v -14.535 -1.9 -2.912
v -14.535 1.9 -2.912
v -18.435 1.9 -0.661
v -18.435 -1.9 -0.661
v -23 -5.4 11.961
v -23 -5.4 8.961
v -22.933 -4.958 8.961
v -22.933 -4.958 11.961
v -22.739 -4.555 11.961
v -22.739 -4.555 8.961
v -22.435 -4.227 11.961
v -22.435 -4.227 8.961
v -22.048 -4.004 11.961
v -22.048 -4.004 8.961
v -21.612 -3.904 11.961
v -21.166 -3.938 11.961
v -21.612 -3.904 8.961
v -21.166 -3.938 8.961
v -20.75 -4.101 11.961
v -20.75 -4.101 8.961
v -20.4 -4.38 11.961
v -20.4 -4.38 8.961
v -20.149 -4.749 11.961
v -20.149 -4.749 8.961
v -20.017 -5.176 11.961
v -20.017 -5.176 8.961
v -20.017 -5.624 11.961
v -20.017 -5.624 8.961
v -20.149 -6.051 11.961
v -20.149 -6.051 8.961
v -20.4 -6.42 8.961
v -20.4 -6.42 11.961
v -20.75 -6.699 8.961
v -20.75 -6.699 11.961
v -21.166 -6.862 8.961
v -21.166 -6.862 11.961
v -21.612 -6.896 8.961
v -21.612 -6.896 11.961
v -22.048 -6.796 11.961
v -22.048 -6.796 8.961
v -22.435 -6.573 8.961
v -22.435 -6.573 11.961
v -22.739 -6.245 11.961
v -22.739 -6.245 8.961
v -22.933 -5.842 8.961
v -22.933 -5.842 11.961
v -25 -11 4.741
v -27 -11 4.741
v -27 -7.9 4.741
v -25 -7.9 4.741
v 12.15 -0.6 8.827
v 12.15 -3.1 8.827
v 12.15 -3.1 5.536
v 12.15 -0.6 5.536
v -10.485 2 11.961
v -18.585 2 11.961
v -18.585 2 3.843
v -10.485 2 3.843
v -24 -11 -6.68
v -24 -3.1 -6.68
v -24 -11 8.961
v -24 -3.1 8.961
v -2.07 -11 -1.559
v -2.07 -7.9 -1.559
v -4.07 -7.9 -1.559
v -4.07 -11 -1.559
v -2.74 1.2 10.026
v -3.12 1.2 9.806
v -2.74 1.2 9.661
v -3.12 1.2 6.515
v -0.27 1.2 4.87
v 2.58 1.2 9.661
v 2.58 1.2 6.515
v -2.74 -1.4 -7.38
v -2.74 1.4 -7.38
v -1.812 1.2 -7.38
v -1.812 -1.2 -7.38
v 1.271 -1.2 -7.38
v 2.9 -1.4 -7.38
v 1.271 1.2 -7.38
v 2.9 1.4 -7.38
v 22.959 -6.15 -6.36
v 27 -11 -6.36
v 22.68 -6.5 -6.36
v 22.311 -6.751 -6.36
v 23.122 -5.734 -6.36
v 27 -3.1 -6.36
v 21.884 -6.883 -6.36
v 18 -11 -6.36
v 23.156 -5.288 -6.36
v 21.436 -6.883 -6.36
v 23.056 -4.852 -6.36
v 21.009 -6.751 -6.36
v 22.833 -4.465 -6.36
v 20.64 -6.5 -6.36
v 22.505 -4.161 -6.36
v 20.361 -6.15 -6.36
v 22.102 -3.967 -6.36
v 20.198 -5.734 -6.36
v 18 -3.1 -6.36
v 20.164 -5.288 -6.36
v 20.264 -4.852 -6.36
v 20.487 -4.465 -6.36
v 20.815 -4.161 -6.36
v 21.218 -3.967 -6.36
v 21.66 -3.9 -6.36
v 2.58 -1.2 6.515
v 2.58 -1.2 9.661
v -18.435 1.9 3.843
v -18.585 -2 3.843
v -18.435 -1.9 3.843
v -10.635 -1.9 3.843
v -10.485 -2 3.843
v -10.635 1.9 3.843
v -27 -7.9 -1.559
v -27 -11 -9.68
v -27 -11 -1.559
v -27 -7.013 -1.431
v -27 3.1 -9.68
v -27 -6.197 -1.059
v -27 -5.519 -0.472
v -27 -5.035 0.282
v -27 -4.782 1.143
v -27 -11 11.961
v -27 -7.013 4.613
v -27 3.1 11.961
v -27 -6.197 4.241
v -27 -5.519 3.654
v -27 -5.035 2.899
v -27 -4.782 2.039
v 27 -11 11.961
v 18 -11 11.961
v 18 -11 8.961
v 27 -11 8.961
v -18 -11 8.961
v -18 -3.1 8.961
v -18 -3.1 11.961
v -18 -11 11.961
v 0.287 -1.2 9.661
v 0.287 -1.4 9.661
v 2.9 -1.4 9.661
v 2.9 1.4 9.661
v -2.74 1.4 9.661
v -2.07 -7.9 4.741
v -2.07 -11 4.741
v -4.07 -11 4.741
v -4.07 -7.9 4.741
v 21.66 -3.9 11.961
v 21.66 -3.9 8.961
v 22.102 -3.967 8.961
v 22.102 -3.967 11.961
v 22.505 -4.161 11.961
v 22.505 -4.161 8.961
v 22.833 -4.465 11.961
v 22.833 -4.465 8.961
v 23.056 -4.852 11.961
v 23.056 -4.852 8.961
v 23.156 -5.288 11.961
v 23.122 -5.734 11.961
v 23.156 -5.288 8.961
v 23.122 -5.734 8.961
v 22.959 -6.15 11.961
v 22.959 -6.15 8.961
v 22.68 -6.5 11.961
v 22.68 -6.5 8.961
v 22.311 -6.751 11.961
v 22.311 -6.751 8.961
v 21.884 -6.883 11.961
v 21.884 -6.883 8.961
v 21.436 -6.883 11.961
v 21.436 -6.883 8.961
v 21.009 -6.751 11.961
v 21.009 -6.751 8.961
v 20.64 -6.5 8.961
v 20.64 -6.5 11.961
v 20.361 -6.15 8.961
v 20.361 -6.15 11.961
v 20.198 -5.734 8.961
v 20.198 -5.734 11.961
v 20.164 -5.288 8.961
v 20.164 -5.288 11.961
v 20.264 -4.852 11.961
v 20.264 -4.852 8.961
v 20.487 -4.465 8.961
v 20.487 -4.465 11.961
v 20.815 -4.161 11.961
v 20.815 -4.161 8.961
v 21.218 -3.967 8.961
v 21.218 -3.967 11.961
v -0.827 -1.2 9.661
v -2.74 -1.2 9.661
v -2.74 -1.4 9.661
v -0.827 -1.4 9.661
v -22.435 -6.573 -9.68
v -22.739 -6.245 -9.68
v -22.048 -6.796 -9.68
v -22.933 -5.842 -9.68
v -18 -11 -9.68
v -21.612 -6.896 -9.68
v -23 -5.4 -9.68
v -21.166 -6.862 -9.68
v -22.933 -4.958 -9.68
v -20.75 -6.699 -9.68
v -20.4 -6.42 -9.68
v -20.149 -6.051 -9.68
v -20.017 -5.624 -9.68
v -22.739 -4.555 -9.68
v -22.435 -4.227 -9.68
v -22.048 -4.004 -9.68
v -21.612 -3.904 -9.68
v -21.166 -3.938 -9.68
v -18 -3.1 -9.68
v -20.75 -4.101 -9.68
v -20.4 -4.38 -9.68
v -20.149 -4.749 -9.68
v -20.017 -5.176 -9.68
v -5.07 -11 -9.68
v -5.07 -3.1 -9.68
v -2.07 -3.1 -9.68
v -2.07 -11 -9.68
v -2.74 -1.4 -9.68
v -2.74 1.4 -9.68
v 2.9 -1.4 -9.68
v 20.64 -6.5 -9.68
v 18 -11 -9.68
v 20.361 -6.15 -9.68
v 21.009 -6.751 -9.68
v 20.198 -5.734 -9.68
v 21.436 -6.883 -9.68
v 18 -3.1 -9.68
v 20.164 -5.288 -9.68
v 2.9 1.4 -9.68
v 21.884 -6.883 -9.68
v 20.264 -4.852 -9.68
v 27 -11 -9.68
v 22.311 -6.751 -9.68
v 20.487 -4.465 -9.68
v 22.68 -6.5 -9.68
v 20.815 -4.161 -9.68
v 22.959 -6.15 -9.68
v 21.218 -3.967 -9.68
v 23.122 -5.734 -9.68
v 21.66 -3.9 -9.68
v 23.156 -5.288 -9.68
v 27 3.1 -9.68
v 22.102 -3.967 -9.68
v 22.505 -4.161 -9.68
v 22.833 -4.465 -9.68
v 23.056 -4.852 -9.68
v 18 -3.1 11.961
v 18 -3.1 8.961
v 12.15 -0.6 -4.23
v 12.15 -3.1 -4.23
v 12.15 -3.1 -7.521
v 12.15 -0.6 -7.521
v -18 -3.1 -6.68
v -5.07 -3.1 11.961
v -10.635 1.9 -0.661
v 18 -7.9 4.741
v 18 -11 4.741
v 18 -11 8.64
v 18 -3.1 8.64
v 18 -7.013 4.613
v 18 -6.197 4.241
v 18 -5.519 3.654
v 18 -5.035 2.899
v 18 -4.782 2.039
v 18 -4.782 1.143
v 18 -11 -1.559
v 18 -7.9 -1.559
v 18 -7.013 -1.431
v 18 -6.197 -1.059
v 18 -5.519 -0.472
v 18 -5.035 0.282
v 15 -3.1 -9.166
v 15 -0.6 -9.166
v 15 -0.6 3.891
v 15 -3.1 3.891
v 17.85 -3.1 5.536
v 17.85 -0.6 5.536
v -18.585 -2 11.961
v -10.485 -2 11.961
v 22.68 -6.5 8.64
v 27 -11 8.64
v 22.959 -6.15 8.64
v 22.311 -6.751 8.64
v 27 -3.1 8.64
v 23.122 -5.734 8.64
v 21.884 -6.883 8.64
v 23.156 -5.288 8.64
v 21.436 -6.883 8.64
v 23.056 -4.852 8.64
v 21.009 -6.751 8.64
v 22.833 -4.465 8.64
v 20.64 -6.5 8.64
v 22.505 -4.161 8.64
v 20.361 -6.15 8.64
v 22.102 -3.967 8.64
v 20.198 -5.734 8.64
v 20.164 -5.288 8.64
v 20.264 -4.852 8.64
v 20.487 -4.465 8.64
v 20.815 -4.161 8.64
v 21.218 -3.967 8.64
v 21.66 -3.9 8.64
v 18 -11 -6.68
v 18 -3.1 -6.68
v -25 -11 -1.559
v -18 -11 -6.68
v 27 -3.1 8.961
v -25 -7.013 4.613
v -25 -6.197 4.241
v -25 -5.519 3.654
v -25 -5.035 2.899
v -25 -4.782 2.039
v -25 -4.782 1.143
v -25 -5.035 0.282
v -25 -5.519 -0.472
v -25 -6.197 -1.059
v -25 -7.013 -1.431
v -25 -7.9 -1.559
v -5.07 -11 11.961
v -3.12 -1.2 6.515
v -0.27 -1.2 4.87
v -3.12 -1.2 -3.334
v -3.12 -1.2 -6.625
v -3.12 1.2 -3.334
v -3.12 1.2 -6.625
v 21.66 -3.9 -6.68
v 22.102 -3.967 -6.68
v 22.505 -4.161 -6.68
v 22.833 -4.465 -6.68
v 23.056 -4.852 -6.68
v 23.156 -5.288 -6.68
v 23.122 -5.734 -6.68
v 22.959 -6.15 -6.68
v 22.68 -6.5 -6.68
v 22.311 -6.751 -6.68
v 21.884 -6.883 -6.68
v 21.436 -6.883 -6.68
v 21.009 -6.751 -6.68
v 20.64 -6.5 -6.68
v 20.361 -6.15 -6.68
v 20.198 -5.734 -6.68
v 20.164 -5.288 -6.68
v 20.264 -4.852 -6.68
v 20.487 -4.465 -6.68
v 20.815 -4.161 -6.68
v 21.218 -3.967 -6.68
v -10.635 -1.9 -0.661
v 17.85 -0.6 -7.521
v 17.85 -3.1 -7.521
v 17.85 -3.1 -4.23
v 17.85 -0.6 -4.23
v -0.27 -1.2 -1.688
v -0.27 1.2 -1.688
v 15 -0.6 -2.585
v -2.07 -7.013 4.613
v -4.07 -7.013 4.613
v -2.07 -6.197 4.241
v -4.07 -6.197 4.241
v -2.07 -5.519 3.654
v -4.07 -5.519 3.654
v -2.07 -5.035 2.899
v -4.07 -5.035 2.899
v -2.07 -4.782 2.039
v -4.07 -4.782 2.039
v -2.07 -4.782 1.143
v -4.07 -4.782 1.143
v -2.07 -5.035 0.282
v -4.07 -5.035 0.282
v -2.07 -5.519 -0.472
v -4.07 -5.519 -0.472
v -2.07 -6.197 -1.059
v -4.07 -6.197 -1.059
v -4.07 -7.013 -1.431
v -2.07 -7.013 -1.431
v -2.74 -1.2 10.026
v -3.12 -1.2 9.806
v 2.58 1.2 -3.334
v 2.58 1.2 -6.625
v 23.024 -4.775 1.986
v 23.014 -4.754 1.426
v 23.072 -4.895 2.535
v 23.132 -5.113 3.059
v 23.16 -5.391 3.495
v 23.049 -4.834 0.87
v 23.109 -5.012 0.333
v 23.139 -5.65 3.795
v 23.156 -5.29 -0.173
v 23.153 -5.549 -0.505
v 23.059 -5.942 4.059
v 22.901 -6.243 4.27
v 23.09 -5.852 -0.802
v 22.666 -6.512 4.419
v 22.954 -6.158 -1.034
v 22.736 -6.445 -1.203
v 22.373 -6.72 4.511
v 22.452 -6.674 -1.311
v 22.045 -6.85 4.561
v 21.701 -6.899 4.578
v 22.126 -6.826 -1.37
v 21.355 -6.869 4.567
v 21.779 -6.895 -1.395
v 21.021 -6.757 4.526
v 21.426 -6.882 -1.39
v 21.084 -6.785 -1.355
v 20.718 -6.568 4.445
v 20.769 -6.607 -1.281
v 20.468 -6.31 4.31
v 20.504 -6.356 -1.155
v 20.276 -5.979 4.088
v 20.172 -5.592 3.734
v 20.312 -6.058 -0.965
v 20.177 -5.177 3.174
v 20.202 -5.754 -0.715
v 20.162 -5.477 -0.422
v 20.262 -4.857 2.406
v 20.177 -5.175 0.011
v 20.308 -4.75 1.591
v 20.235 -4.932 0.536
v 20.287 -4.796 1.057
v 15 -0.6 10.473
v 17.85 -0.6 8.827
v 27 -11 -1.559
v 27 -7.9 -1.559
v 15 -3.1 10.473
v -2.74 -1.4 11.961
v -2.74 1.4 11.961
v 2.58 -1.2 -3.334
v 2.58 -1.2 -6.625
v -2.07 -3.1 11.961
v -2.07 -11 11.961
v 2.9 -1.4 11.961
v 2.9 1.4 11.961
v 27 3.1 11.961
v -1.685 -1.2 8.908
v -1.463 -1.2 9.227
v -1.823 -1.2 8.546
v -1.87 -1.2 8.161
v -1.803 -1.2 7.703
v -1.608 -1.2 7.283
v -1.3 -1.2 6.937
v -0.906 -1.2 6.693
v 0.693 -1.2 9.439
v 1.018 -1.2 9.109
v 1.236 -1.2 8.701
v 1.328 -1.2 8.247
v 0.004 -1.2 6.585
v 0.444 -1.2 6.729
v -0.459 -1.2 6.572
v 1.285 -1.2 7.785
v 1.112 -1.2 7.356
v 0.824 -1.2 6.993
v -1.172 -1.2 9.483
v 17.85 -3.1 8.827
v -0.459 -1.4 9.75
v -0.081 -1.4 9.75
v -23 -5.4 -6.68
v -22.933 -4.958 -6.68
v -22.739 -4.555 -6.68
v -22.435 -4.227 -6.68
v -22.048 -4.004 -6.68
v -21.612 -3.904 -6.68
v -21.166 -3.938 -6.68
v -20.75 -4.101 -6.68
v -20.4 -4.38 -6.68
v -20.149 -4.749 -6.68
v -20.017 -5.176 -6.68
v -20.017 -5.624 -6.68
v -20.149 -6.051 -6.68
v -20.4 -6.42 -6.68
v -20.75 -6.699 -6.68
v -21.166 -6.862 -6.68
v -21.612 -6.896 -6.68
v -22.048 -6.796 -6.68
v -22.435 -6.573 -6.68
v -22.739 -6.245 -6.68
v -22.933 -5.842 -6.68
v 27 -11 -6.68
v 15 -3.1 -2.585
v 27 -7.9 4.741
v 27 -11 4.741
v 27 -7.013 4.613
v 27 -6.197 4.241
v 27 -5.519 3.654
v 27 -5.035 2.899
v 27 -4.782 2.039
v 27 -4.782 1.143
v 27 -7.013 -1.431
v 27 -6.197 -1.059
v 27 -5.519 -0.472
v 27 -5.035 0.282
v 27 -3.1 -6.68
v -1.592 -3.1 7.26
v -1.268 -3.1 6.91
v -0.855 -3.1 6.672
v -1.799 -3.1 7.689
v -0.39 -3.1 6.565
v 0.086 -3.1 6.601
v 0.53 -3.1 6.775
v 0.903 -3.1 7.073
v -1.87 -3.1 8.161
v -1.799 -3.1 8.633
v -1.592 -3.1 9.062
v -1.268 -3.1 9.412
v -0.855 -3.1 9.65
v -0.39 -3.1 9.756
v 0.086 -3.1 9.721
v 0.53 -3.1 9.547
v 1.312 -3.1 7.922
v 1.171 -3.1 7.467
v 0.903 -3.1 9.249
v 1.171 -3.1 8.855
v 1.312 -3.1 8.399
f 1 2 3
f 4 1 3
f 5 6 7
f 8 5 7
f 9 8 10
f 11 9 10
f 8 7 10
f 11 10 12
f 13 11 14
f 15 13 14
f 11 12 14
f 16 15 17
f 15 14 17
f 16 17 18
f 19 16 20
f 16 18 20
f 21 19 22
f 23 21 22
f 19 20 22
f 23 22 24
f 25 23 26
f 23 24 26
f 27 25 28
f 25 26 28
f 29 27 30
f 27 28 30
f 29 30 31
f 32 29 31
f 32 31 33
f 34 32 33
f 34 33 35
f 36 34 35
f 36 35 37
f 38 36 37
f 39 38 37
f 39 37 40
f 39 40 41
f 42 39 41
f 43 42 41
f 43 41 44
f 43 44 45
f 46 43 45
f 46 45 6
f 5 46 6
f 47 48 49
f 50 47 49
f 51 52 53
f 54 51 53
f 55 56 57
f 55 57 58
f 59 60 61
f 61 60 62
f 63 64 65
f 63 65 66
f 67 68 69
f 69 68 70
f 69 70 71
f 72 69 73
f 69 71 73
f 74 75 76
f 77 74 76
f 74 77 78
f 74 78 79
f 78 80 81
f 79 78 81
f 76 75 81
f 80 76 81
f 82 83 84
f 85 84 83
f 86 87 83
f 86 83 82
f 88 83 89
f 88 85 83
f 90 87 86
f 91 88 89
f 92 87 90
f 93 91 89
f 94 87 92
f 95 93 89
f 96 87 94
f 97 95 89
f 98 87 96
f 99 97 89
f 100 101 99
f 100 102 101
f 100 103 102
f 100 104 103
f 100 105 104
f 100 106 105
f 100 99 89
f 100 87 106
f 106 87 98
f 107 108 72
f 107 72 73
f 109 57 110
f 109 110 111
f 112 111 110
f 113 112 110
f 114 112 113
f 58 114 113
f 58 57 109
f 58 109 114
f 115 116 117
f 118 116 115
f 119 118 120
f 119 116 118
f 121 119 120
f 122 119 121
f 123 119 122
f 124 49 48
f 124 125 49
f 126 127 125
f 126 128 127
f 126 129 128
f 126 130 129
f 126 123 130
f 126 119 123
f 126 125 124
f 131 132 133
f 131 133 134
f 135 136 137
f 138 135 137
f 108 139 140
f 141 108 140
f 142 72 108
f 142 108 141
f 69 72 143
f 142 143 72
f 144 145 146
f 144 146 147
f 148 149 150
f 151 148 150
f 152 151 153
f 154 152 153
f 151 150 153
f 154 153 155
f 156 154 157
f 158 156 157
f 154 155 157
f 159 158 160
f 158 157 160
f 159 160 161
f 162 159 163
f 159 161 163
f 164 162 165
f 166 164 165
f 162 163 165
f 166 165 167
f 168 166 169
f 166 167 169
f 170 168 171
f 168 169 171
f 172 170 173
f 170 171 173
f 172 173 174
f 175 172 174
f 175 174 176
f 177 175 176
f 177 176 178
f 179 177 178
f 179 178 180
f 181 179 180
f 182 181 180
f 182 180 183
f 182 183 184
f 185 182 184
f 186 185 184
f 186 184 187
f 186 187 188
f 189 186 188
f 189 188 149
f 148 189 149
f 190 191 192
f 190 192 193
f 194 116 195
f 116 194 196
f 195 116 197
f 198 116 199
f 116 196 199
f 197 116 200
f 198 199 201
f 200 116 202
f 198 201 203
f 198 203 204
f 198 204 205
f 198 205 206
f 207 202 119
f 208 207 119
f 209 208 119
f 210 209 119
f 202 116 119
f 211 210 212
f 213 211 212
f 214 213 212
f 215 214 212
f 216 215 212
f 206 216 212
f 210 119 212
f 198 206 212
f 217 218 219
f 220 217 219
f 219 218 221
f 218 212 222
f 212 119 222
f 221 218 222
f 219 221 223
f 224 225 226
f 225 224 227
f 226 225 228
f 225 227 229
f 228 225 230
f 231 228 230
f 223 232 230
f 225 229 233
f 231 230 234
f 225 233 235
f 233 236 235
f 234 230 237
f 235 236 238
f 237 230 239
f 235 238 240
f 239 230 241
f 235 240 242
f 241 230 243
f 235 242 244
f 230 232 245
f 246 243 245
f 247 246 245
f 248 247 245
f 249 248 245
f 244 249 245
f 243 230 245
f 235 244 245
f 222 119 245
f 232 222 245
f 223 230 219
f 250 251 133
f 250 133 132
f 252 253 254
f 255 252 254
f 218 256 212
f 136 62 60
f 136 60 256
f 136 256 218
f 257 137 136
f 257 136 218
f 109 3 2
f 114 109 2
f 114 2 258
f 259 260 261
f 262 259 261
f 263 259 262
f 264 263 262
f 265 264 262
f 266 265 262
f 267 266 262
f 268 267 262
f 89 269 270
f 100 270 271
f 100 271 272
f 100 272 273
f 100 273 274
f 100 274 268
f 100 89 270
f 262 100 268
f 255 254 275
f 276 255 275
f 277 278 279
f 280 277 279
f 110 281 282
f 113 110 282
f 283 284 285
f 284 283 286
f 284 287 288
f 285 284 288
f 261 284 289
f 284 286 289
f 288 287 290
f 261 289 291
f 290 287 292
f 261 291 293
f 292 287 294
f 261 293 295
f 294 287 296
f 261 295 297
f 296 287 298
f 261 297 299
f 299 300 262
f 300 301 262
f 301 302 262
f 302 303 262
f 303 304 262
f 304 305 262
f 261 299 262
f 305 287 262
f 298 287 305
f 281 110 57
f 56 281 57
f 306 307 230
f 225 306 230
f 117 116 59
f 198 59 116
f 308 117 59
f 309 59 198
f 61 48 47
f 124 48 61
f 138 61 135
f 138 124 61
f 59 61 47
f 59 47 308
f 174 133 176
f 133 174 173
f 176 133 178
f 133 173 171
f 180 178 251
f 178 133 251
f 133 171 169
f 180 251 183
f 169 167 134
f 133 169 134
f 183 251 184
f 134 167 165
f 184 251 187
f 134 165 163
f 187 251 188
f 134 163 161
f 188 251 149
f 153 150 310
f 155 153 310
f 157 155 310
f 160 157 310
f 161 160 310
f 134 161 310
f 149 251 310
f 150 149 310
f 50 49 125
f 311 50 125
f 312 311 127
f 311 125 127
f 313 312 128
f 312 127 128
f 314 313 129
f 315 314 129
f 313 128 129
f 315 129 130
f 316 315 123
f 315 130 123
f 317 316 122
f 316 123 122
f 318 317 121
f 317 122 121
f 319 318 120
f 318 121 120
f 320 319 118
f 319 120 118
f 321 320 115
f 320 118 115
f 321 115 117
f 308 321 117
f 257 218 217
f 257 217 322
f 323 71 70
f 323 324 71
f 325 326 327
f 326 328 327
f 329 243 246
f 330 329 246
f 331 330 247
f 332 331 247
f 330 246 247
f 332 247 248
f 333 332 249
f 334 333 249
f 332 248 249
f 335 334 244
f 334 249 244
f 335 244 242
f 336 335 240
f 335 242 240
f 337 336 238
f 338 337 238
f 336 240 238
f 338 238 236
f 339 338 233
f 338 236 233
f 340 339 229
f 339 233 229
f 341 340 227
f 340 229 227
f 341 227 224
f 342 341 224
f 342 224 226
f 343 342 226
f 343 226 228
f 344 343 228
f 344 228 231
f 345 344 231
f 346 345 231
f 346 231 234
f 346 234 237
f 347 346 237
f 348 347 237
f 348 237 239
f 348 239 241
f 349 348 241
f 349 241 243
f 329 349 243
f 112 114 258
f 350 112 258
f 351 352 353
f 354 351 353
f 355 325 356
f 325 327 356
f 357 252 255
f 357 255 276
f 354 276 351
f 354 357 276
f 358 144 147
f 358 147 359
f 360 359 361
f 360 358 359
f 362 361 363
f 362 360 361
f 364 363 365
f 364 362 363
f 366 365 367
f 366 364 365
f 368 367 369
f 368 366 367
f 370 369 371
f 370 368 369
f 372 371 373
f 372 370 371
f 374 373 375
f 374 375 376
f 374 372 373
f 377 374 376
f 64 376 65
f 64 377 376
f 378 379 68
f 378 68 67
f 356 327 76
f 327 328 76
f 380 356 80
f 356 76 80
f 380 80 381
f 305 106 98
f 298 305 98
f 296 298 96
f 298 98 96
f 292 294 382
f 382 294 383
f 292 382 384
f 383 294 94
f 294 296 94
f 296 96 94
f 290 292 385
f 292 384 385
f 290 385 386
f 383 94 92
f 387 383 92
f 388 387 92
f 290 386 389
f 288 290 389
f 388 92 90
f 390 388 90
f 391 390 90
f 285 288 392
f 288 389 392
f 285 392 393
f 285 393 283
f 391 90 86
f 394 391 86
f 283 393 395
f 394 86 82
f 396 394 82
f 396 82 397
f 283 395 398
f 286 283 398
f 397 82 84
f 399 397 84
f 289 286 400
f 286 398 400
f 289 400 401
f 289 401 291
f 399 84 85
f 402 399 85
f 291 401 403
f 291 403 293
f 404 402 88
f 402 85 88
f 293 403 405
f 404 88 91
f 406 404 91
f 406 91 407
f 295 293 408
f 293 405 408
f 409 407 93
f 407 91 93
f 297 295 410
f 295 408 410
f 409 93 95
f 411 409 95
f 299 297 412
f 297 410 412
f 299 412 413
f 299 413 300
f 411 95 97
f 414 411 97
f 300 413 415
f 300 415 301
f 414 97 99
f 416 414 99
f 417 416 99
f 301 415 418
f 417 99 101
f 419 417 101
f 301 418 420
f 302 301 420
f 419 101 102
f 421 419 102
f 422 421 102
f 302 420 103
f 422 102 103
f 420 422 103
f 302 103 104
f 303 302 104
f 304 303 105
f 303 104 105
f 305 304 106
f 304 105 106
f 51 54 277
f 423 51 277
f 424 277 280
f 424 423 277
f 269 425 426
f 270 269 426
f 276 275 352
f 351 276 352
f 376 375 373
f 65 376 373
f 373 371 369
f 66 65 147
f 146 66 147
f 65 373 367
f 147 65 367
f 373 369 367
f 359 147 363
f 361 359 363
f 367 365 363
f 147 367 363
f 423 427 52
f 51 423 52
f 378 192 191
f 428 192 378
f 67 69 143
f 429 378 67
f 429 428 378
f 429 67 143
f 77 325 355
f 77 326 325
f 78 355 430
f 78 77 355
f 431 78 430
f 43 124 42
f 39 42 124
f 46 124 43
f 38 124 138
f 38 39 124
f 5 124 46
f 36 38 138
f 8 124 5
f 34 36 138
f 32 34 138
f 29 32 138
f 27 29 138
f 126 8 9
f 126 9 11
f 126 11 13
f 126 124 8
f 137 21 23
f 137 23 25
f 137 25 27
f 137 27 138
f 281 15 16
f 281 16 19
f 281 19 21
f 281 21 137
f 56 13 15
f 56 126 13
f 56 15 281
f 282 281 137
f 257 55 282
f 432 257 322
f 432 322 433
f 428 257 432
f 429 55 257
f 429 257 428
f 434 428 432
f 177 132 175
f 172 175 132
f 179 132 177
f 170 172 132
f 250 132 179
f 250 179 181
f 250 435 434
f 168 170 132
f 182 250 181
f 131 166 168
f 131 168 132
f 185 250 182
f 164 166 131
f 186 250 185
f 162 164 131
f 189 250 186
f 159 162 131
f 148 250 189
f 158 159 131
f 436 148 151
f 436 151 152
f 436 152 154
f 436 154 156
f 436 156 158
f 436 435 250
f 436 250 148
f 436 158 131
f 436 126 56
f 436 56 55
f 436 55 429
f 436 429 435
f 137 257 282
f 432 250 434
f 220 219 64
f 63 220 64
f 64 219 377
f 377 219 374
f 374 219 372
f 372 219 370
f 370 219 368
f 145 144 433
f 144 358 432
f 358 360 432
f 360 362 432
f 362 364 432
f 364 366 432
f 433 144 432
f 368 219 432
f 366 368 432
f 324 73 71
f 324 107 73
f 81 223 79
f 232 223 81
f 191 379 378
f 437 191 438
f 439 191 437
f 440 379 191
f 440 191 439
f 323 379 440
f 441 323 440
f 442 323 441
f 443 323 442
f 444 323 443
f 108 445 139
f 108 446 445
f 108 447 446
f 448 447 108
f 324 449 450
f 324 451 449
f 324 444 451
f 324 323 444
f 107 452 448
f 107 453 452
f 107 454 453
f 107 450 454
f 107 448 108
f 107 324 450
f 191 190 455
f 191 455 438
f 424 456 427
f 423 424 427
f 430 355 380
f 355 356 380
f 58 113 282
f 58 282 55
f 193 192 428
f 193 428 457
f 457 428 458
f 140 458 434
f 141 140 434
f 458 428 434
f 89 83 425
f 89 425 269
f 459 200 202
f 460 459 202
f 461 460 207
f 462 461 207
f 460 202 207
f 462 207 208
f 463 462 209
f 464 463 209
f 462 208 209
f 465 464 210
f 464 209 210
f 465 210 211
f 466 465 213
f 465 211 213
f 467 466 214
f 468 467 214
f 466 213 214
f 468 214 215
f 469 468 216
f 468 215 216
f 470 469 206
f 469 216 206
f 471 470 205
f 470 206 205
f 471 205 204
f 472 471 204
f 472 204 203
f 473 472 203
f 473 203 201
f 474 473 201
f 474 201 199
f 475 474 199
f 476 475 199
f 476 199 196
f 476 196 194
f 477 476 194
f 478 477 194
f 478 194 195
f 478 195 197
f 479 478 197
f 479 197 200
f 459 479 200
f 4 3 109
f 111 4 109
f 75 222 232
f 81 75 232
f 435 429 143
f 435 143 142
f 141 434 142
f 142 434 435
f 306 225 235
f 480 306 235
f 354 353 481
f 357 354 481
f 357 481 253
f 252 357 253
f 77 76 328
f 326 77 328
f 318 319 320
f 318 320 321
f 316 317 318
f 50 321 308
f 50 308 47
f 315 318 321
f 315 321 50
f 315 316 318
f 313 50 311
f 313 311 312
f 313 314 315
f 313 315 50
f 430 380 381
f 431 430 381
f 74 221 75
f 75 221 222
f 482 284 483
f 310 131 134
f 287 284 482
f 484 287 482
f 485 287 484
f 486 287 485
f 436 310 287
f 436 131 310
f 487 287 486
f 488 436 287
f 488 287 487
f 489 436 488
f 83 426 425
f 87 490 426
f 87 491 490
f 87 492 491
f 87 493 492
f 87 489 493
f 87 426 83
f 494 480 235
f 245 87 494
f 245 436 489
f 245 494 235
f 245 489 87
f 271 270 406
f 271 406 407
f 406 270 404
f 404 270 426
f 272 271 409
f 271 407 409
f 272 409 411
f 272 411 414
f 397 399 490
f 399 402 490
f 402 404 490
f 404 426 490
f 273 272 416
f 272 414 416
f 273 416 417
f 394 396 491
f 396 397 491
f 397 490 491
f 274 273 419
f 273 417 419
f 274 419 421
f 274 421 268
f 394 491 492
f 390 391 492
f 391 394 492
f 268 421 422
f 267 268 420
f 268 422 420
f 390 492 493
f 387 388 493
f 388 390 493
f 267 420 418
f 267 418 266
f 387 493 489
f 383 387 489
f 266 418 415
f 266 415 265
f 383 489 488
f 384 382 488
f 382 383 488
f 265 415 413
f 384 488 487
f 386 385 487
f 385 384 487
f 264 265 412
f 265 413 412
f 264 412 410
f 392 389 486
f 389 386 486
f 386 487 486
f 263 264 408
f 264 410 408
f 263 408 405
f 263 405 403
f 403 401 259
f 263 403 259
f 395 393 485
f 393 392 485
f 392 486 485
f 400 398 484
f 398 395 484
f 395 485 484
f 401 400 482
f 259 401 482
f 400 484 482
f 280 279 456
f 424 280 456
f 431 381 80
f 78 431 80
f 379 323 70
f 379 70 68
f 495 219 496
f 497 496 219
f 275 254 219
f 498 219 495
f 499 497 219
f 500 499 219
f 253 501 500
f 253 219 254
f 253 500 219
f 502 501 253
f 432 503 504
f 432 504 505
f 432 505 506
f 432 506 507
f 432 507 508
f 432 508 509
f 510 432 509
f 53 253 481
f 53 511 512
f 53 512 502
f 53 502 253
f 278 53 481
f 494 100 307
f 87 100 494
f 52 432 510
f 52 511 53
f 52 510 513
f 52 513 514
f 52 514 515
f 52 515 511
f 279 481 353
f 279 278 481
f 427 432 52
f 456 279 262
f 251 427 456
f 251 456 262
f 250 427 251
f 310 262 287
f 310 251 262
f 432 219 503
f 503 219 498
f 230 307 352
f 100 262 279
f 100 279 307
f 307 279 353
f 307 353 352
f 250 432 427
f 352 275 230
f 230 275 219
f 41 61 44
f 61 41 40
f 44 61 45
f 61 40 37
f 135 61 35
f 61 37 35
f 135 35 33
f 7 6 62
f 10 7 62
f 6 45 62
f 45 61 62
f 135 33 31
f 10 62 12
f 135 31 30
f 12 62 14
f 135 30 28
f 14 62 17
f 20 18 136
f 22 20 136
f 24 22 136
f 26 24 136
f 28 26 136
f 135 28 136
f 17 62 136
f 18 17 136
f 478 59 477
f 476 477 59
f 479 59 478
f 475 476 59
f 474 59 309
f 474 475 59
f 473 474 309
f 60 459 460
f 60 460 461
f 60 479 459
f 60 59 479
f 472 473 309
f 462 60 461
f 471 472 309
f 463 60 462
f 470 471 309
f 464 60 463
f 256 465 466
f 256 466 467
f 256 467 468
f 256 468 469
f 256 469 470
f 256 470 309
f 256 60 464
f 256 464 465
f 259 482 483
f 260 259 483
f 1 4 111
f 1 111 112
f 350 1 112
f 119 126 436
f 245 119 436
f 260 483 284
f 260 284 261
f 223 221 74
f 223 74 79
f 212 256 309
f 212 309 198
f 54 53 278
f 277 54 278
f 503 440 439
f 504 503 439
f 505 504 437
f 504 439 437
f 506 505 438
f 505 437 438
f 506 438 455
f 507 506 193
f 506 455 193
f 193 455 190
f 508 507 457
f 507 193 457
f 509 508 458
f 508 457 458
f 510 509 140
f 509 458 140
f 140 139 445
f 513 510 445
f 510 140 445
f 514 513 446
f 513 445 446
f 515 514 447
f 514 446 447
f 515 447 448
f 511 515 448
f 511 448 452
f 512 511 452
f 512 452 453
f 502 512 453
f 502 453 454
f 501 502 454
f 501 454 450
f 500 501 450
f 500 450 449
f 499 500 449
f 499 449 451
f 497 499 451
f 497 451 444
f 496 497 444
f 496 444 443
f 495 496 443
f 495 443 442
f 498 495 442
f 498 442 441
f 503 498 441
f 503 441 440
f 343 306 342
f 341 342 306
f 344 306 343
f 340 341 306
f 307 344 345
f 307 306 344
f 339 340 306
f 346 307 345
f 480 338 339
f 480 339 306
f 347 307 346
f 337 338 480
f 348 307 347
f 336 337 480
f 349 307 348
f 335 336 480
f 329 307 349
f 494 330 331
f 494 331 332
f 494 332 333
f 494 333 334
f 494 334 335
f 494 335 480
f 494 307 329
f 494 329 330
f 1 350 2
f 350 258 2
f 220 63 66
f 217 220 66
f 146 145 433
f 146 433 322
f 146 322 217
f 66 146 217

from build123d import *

# Parameters (mm, degrees)
SKETCH2_W           = 54
SKETCH2_H           = 6.2
BOSS_EXTRUDE2_DEPTH = 12.5
SKETCH3_R           = 2.8
CUT_EXTRUDE1_DEPTH  = 6.2
CUT_EXTRUDE2_DEPTH  = 1.9
SKETCH6_W           = 8.1
SKETCH6_H           = 4
CUT_EXTRUDE3_DEPTH  = 8.65741
SKETCH7_W           = 3
SKETCH7_H           = 25
BOSS_EXTRUDE3_DEPTH = 7.9
CUT_EXTRUDE4_DEPTH  = 2
SKETCH9_R           = 0.7
CUT_EXTRUDE5_DEPTH  = 2
SKETCH13_W          = 54
SKETCH13_H          = 2.82
CUT_EXTRUDE6_DEPTH  = 33.925066439
SKETCH18_W          = 3
SKETCH18_H          = 2.82
CUT_EXTRUDE9_DEPTH  = 10
SKETCH19_W          = 0.539072716
SKETCH19_H          = 14.1
CUT_EXTRUDE11_DEPTH = 57.508848865
CUT_EXTRUDE13_DEPTH = 2.5
CUT_EXTRUDE15_START = -2
SKETCH23_R          = 1.6
CUT_EXTRUDE15_DEPTH = 7
CUT_EXTRUDE16_DEPTH = 1.2
SKETCH26_W          = 5.64
SKETCH26_H          = 2.8
CUT_EXTRUDE17_DEPTH = 2.3
SKETCH29_W          = 9
SKETCH29_H          = 3
BOSS_EXTRUDE5_DEPTH = 7.9
SKETCH34_W          = 9
SKETCH34_H          = 7.9
BOSS_EXTRUDE6_DEPTH = 7.5
CUT_EXTRUDE19_DEPTH = 9
CUT_EXTRUDE20_DEPTH = 2.5
SKETCH31_R          = 1.5
CUT_EXTRUDE18_DEPTH = 37.30881069


with BuildPart() as part:
    # Sketch2 → Boss-Extrude2 (new, symmetric)
    with BuildSketch(Plane(origin=(10.528308017, 2.71655886, 0), x_dir=(1, 0, 0), z_dir=(0, 0, 1))):
        with Locations((-10.528308017, -2.71655886)):
            Rectangle(SKETCH2_W, SKETCH2_H)
    extrude(amount=BOSS_EXTRUDE2_DEPTH, both=True)

    # Sketch3 → Cut-Extrude1 (cut)
    with BuildSketch(Plane.XZ.offset(3.1)):
        with Locations((-12.165967216, -142.374755929)):
            Circle(SKETCH3_R)
    extrude(amount=-CUT_EXTRUDE1_DEPTH, mode=Mode.SUBTRACT)

    # Sketch4 → Cut-Extrude2 (cut, symmetric)
    with BuildSketch(Plane(origin=(0, 0, 0), x_dir=(1, 0, 0), z_dir=(0, 1, 0))):
        Polygon((-10.635076842, 0.660738766), (-14.535076842, 2.912404816), (-18.435076842, 0.660738766), (-18.435076842, -3.842593333), (-14.535076842, -6.094259383), (-10.635076842, -3.842593333), align=None)
    extrude(amount=CUT_EXTRUDE2_DEPTH, both=True, mode=Mode.SUBTRACT)

    # Sketch6 → Cut-Extrude3 (cut)
    with BuildSketch(Plane.XY.offset(12.5)):
        with Locations((-14.535076842, 0)):
            Rectangle(SKETCH6_W, SKETCH6_H)
    extrude(amount=-CUT_EXTRUDE3_DEPTH, mode=Mode.SUBTRACT)

    # Sketch7 → Boss-Extrude3 (add)
    with BuildSketch(Plane.XZ.offset(3.1)):
        with Locations((-25.5, 0)):
            Rectangle(SKETCH7_W, SKETCH7_H)
    boss_extrude3 = extrude(amount=BOSS_EXTRUDE3_DEPTH)

    # Sketch8 → Cut-Extrude4 (cut)
    with BuildSketch(Plane.ZY.offset(27)):
        with BuildLine():
            Line((-1.559072716, -7.9), (-1.559072716, -11))
            Line((-1.559072716, -11), (4.740927284, -11))
            Line((4.740927284, -11), (4.740927284, -7.9))
            ThreePointArc((4.740927284, -7.9), (1.590927284, -4.75), (-1.559072716, -7.9))
        make_face()
    cut_extrude4 = extrude(amount=-CUT_EXTRUDE4_DEPTH, mode=Mode.SUBTRACT)

    # Sketch9 → Cut-Extrude5 (cut)
    with BuildSketch(Plane(origin=(-24, 0, 0), x_dir=(0, 0, -1), z_dir=(1, 0, 0))):
        with Locations((142.374755929, -8.1)):
            Circle(SKETCH9_R)
    cut_extrude5 = extrude(amount=-CUT_EXTRUDE5_DEPTH, mode=Mode.SUBTRACT)

    # Sketch13 → Cut-Extrude6 (cut, through all)
    with BuildSketch(Plane(origin=(0, 3.1, 0), x_dir=(1, 0, 0), z_dir=(0, 1, 0))):
        with Locations((0, 11.09)):
            Rectangle(SKETCH13_W, SKETCH13_H)
    extrude(amount=-CUT_EXTRUDE6_DEPTH, mode=Mode.SUBTRACT)

    # Mirror1: Boss-Extrude3, Cut-Extrude4, Cut-Extrude5 across plane
    add(boss_extrude3.mirror(Plane.ZY.offset(14.535076842)))
    add(cut_extrude4.mirror(Plane.ZY.offset(14.535076842)), mode=Mode.SUBTRACT)
    add(cut_extrude5.mirror(Plane.ZY.offset(14.535076842)), mode=Mode.SUBTRACT)

    # Sketch18 → Cut-Extrude9 (cut)
    with BuildSketch(Plane(origin=(0, -3.1, 0), x_dir=(1, 0, 0), z_dir=(0, 1, 0))):
        with Locations((-3.570153685, 11.09)):
            Rectangle(SKETCH18_W, SKETCH18_H)
    extrude(amount=-CUT_EXTRUDE9_DEPTH, mode=Mode.SUBTRACT)

    # Sketch19 → Cut-Extrude11 (cut, through all)
    with BuildSketch(Plane.ZY.offset(27)):
        with Locations((12.230463642, -3.95)):
            Rectangle(SKETCH19_W, SKETCH19_H)
    extrude(amount=-CUT_EXTRUDE11_DEPTH, mode=Mode.SUBTRACT)

    # Sketch22 → Cut-Extrude13 (cut)
    with BuildSketch(Plane.XZ.offset(3.1)):
        Polygon((15, 10.472778345), (12.15, 8.827330078), (12.15, 5.536433544), (15, 3.890985277), (17.85, 5.536433544), (17.85, 8.827330078), align=None)
        Polygon((15, -2.584684642), (12.15, -4.230132909), (12.15, -7.521029443), (15, -9.16647771), (17.85, -7.521029443), (17.85, -4.230132909), align=None)
    extrude(amount=-CUT_EXTRUDE13_DEPTH, mode=Mode.SUBTRACT)

    # Sketch23 → Cut-Extrude15 (cut)
    with BuildSketch(Plane(origin=(0, 3.1, 0), x_dir=(1, 0, 0), z_dir=(0, 1, 0)).offset(CUT_EXTRUDE15_START)):
        with Locations((-0.270153685, 292.910439142)):
            Circle(SKETCH23_R)
        with Locations(Location((-0.270153685, -8.160927284, 0), (0, 0, 180))):
            Circle(SKETCH23_R)
    extrude(amount=-CUT_EXTRUDE15_DEPTH, mode=Mode.SUBTRACT)

    # Sketch24 → Cut-Extrude16 (cut, symmetric)
    with BuildSketch(Plane(origin=(0, 0, 0), x_dir=(1, 0, 0), z_dir=(0, 1, 0))):
        Polygon((-0.270153685, -11.451823818), (2.579846315, -9.806375551), (2.579846315, -6.515479016), (-0.270153685, -4.870030749), (-3.120153685, -6.515479016), (-3.120153685, -9.806375551), align=None)
        Polygon((-0.270153685, 1.688176182), (2.579846315, 3.333624449), (2.579846315, 6.624520984), (-0.270153685, 8.269969251), (-3.120153685, 6.624520984), (-3.120153685, 3.333624449), align=None)
    extrude(amount=CUT_EXTRUDE16_DEPTH, both=True, mode=Mode.SUBTRACT)

    # Sketch26 → Cut-Extrude17 (cut)
    with BuildSketch(Plane.XY.offset(11.960927284)):
        with Locations((0.08, 0)):
            Rectangle(SKETCH26_W, SKETCH26_H)
    cut_extrude17 = extrude(amount=-CUT_EXTRUDE17_DEPTH, mode=Mode.SUBTRACT)

    # Mirror4: Cut-Extrude17 across plane
    add(cut_extrude17.mirror(Plane(origin=(0, 0, 1.140463642), x_dir=(1, 0, 0), z_dir=(0, 0, -1))), mode=Mode.SUBTRACT)

    # Sketch29 → Boss-Extrude5 (add)
    with BuildSketch(Plane.XZ.offset(3.1)):
        with Locations((22.5, 10.460927284)):
            Rectangle(SKETCH29_W, SKETCH29_H)
        with Locations((-22.5, 10.460927284)):
            Rectangle(SKETCH29_W, SKETCH29_H)
    boss_extrude5 = extrude(amount=BOSS_EXTRUDE5_DEPTH)

    # Mirror5: Boss-Extrude5 across plane
    add(boss_extrude5.mirror(Plane(origin=(0, 0, 1.140463642), x_dir=(1, 0, 0), z_dir=(0, 0, -1))))

    # Sketch34 → Boss-Extrude6 (add, symmetric)
    with BuildSketch(Plane(origin=(0, 0, 1.140463642), x_dir=(-1, 0, 0), z_dir=(0, 0, -1))):
        with Locations((-22.5, -7.05)):
            Rectangle(SKETCH34_W, SKETCH34_H)
    extrude(amount=BOSS_EXTRUDE6_DEPTH, both=True)

    # Sketch35 → Cut-Extrude19 (cut)
    with BuildSketch(Plane(origin=(27, 0, 0), x_dir=(0, 0, -1), z_dir=(1, 0, 0))):
        with BuildLine():
            Line((-4.740927284, -11), (1.559072716, -11))
            Line((1.559072716, -11), (1.559072716, -7.9))
            ThreePointArc((1.559072716, -7.9), (-1.590927284, -4.75), (-4.740927284, -7.9))
            Line((-4.740927284, -7.9), (-4.740927284, -11))
        make_face()
    extrude(amount=-CUT_EXTRUDE19_DEPTH, mode=Mode.SUBTRACT)

    # Sketch36 → Cut-Extrude20 (cut)
    with BuildSketch(Plane.XZ.offset(11)):
        with BuildLine():
            Line((-18, -150.496582169), (-18, -147.496582169))
            Line((-18, -147.496582169), (-20.754732899, -147.496582169))
            ThreePointArc((-20.754732899, -147.496582169), (-19.531717613, -149.138314245), (-18, -150.496582169))
        make_face()
        with BuildLine():
            Line((-20.754732899, -137.252929689), (-18, -137.252929689))
            Line((-18, -137.252929689), (-18, -134.252929689))
            ThreePointArc((-18, -134.252929689), (-19.531717613, -135.611197614), (-20.754732899, -137.252929689))
        make_face()
    extrude(amount=-CUT_EXTRUDE20_DEPTH, mode=Mode.SUBTRACT)

    # Sketch31 → Cut-Extrude18 (cut, through all)
    with BuildSketch(Plane(origin=(0, 0, -9.68), x_dir=(-1, 0, 0), z_dir=(0, 0, -1))):
        with Locations(Location((-21.66, -5.4, 0), (0, 0, 90))):
            Circle(SKETCH31_R)
        with Locations((21.5, -5.4)):
            Circle(SKETCH31_R)
    extrude(amount=-CUT_EXTRUDE18_DEPTH, mode=Mode.SUBTRACT)


solid = part.part
